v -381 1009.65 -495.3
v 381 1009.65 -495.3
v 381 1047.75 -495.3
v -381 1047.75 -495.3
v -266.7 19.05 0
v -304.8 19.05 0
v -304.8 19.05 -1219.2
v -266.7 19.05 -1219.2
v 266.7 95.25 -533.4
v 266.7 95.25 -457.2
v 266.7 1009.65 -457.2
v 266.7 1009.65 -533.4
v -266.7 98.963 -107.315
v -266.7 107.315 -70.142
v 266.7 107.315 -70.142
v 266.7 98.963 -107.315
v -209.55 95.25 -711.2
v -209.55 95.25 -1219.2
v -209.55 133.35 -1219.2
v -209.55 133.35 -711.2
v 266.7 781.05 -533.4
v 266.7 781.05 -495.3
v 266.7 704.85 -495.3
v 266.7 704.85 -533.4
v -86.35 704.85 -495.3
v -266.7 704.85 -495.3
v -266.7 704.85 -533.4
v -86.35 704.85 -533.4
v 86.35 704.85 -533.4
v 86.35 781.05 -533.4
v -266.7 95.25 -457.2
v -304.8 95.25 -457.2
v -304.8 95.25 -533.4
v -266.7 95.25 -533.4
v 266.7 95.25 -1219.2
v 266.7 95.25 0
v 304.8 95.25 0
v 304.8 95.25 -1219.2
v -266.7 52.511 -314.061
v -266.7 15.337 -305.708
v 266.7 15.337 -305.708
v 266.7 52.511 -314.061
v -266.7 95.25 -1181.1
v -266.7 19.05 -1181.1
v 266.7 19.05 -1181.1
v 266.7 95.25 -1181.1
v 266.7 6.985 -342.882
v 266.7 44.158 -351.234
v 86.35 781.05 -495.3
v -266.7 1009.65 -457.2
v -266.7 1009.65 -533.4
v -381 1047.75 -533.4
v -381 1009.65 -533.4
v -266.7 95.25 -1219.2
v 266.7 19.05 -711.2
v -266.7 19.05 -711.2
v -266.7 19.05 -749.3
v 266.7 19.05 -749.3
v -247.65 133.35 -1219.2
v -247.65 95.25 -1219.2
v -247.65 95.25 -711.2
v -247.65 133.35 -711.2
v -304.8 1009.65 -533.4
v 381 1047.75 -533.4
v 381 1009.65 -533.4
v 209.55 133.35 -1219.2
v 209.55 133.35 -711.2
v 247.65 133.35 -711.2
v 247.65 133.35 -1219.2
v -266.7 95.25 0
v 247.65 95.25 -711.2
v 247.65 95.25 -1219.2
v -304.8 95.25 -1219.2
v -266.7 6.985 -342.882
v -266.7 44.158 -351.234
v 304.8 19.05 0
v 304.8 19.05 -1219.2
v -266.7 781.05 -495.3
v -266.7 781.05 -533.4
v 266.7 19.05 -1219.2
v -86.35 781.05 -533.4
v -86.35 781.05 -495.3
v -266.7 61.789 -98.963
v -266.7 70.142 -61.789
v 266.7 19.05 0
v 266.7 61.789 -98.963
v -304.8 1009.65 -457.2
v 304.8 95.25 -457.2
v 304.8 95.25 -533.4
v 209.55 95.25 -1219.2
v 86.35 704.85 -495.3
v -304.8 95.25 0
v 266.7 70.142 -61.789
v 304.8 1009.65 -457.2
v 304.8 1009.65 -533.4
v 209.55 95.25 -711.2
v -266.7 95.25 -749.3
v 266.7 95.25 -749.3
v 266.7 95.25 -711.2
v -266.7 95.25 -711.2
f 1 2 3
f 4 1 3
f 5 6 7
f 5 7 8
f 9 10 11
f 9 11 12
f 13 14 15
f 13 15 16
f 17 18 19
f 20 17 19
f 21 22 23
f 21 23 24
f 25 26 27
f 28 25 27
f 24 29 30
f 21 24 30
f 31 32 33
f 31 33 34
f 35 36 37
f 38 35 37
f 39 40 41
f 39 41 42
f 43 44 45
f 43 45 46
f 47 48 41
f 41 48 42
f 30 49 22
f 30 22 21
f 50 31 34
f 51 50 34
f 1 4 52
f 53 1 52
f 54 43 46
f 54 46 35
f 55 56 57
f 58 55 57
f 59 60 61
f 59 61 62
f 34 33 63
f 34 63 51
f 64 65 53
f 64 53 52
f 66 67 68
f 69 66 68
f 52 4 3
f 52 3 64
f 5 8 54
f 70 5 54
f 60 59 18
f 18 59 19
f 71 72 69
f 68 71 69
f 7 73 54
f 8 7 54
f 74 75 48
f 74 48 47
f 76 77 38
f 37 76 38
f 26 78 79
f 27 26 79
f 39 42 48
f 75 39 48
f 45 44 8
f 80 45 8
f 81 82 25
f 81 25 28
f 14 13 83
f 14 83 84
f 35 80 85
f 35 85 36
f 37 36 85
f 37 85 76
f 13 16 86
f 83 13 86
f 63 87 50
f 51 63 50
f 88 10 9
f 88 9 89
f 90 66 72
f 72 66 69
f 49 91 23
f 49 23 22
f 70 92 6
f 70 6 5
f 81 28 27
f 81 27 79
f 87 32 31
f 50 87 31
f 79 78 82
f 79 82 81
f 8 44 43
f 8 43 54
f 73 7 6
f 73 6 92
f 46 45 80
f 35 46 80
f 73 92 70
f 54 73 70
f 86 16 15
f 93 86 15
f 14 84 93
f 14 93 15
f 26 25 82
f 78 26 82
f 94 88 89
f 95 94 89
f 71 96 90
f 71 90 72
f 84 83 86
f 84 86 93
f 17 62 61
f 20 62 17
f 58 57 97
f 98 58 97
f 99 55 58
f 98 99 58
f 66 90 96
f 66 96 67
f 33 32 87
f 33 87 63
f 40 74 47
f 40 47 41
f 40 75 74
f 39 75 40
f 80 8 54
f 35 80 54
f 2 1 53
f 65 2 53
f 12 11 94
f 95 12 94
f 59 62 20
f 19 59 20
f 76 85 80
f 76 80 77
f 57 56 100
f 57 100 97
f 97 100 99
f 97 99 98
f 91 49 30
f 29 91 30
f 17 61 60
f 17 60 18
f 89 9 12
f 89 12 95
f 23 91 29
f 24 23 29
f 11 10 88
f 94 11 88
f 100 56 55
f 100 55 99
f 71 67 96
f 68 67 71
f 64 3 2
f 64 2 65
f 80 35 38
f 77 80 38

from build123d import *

# Parameters (mm, degrees)
SKETCH1_W                  = 38.1
SKETCH1_H                  = 76.2
BOSS_EXTRUDE1_DEPTH        = 1219.2
BOSS_EXTRUDE1_2_DEPTH      = 1219.2
BOSS_EXTRUDE2_DEPTH        = 266.7
BOSS_EXTRUDE2_DEPTH_BACK   = 266.7
SKETCH2_W                  = 38.1
SKETCH2_H                  = 76.2
BOSS_EXTRUDE2_2_DEPTH      = 266.7
BOSS_EXTRUDE2_2_DEPTH_BACK = 266.7
SKETCH3_W                  = 38.1
SKETCH3_H                  = 76.2
BOSS_EXTRUDE3_DEPTH        = 914.4
BOSS_EXTRUDE3_2_DEPTH      = 914.4
SKETCH4_W                  = 38.1
SKETCH4_H                  = 38.1
BOSS_EXTRUDE4_DEPTH        = 508
BOSS_EXTRUDE4_2_DEPTH      = 508
BOSS_EXTRUDE5_DEPTH        = 266.7
BOSS_EXTRUDE5_DEPTH_BACK   = 266.7
BOSS_EXTRUDE5_2_DEPTH      = 266.7
BOSS_EXTRUDE5_2_DEPTH_BACK = 266.7
BOSS_EXTRUDE6_DEPTH        = 266.7
BOSS_EXTRUDE6_DEPTH_BACK   = 266.7
SKETCH7_W                  = 38.1
SKETCH7_H                  = 76.2
SKETCH7_2_W                = 38.1
SKETCH7_2_H                = 76.2
CUT_EXTRUDE1_DEPTH         = 86.35000002
SKETCH8_W                  = 38.1
SKETCH8_H                  = 38.1
BOSS_EXTRUDE7_DEPTH        = 381


with BuildPart() as part:
    # Sketch1 → Boss-Extrude1 (new body)
    with BuildSketch(Plane.XY):
        with Locations((-285.75, 57.15)):
            Rectangle(SKETCH1_W, SKETCH1_H)
    extrude(amount=-BOSS_EXTRUDE1_DEPTH)


with BuildPart() as body_2:
    # Sketch1 → Boss-Extrude1 2 (new body)
    with BuildSketch(Plane.XY):
        with Locations((285.75, 57.15)):
            Rectangle(SKETCH1_W, SKETCH1_H)
    extrude(amount=-BOSS_EXTRUDE1_2_DEPTH)


with BuildPart() as body_3:
    # Sketch2 → Boss-Extrude2 (new, two sides: drawn at the far end of the back side and taken through both)
    with BuildSketch(Plane(origin=(0, 0, 0), x_dir=(0, 0, -1), z_dir=(1, 0, 0)).offset(-BOSS_EXTRUDE2_DEPTH_BACK)):
        with Locations((1200.15, 57.15)):
            Rectangle(SKETCH2_W, SKETCH2_H)
    extrude(amount=BOSS_EXTRUDE2_DEPTH + BOSS_EXTRUDE2_DEPTH_BACK)


with BuildPart() as body_4:
    # Sketch2 → Boss-Extrude2 2 (new, two sides: drawn at the far end of the back side and taken through both)
    with BuildSketch(Plane(origin=(0, 0, 0), x_dir=(0, 0, -1), z_dir=(1, 0, 0)).offset(-BOSS_EXTRUDE2_2_DEPTH_BACK)):
        with Locations((730.25, 57.15)):
            Rectangle(SKETCH2_W, SKETCH2_H)
    extrude(amount=BOSS_EXTRUDE2_2_DEPTH + BOSS_EXTRUDE2_2_DEPTH_BACK)


with BuildPart() as body_5:
    # Sketch3 → Boss-Extrude3 (new body)
    with BuildSketch(Plane(origin=(0, 95.25, 0), x_dir=(1, 0, 0), z_dir=(0, 1, 0))):
        with Locations((-285.75, 495.3)):
            Rectangle(SKETCH3_W, SKETCH3_H)
    extrude(amount=BOSS_EXTRUDE3_DEPTH)


with BuildPart() as body_6:
    # Sketch3 → Boss-Extrude3 2 (new body)
    with BuildSketch(Plane(origin=(0, 95.25, 0), x_dir=(1, 0, 0), z_dir=(0, 1, 0))):
        with Locations((285.75, 495.3)):
            Rectangle(SKETCH3_W, SKETCH3_H)
    extrude(amount=BOSS_EXTRUDE3_2_DEPTH)


with BuildPart() as body_7:
    # Sketch4 → Boss-Extrude4 (new body)
    with BuildSketch(Plane.XY.offset(-711.2)):
        with Locations((-228.6, 114.3)):
            Rectangle(SKETCH4_W, SKETCH4_H)
    extrude(amount=-BOSS_EXTRUDE4_DEPTH)


with BuildPart() as body_8:
    # Sketch4 → Boss-Extrude4 2 (new body)
    with BuildSketch(Plane.XY.offset(-711.2)):
        with Locations((228.6, 114.3)):
            Rectangle(SKETCH4_W, SKETCH4_H)
    extrude(amount=-BOSS_EXTRUDE4_2_DEPTH)


with BuildPart() as body_9:
    # Sketch6 → Boss-Extrude5 (new, two sides: drawn at the far end of the back side and taken through both)
    with BuildSketch(Plane(origin=(0, 0, 0), x_dir=(0, 0, -1), z_dir=(1, 0, 0)).offset(-BOSS_EXTRUDE5_DEPTH_BACK)):
        Polygon((61.789465074, 70.141651495), (70.141651495, 107.314907769), (107.314907769, 98.962721347), (98.962721347, 61.789465074), align=None)
    extrude(amount=BOSS_EXTRUDE5_DEPTH + BOSS_EXTRUDE5_DEPTH_BACK)


with BuildPart() as body_10:
    # Sketch6 → Boss-Extrude5 2 (new, two sides: drawn at the far end of the back side and taken through both)
    with BuildSketch(Plane(origin=(0, 0, 0), x_dir=(0, 0, -1), z_dir=(1, 0, 0)).offset(-BOSS_EXTRUDE5_2_DEPTH_BACK)):
        Polygon((305.708469494, 15.337278653), (314.060655915, 52.510534926), (351.233912189, 44.158348505), (342.881725768, 6.985092231), align=None)
    extrude(amount=BOSS_EXTRUDE5_2_DEPTH + BOSS_EXTRUDE5_2_DEPTH_BACK)


with BuildPart() as body_11:
    # Sketch7 → Boss-Extrude6 (new, two sides: drawn at the far end of the back side and taken through both)
    with BuildSketch(Plane(origin=(0, 0, 0), x_dir=(0, 0, -1), z_dir=(1, 0, 0)).offset(-BOSS_EXTRUDE6_DEPTH_BACK)):
        with Locations((514.35, 742.95)):
            Rectangle(SKETCH7_W, SKETCH7_H)
    extrude(amount=BOSS_EXTRUDE6_DEPTH + BOSS_EXTRUDE6_DEPTH_BACK)

    # Sketch7<2> → Cut-Extrude1 (cut, symmetric)
    with BuildSketch(Plane(origin=(0, 0, 0), x_dir=(0, 0, -1), z_dir=(1, 0, 0))):
        with Locations((514.35, 742.95)):
            Rectangle(SKETCH7_2_W, SKETCH7_2_H)
    extrude(amount=CUT_EXTRUDE1_DEPTH, both=True, mode=Mode.SUBTRACT)


with BuildPart() as cut_extrude1_piece_1:
    # of the separate pieces the step leaves, piece 1, a body of its own (cut_extrude1_pieces)
    add(body_11.part.solids().sort_by_distance((266.7, 781.05, -533.4))[0])


with BuildPart() as cut_extrude1_piece_2:
    # of the separate pieces the step leaves, piece 2, a body of its own (cut_extrude1_pieces)
    add(body_11.part.solids().sort_by_distance((-86.35000002, 781.05, -533.4))[0])


with BuildPart() as body_13:
    # Sketch8 → Boss-Extrude7 (new, symmetric)
    with BuildSketch(Plane(origin=(0, 0, 0), x_dir=(0, 0, -1), z_dir=(1, 0, 0))):
        with Locations((514.35, 1028.7)):
            Rectangle(SKETCH8_W, SKETCH8_H)
    extrude(amount=BOSS_EXTRUDE7_DEPTH, both=True)


solid = Compound([part.part, body_2.part, body_3.part, body_4.part, body_5.part, body_6.part, body_7.part, body_8.part, body_9.part, body_10.part, cut_extrude1_piece_1.part, cut_extrude1_piece_2.part, body_13.part])
